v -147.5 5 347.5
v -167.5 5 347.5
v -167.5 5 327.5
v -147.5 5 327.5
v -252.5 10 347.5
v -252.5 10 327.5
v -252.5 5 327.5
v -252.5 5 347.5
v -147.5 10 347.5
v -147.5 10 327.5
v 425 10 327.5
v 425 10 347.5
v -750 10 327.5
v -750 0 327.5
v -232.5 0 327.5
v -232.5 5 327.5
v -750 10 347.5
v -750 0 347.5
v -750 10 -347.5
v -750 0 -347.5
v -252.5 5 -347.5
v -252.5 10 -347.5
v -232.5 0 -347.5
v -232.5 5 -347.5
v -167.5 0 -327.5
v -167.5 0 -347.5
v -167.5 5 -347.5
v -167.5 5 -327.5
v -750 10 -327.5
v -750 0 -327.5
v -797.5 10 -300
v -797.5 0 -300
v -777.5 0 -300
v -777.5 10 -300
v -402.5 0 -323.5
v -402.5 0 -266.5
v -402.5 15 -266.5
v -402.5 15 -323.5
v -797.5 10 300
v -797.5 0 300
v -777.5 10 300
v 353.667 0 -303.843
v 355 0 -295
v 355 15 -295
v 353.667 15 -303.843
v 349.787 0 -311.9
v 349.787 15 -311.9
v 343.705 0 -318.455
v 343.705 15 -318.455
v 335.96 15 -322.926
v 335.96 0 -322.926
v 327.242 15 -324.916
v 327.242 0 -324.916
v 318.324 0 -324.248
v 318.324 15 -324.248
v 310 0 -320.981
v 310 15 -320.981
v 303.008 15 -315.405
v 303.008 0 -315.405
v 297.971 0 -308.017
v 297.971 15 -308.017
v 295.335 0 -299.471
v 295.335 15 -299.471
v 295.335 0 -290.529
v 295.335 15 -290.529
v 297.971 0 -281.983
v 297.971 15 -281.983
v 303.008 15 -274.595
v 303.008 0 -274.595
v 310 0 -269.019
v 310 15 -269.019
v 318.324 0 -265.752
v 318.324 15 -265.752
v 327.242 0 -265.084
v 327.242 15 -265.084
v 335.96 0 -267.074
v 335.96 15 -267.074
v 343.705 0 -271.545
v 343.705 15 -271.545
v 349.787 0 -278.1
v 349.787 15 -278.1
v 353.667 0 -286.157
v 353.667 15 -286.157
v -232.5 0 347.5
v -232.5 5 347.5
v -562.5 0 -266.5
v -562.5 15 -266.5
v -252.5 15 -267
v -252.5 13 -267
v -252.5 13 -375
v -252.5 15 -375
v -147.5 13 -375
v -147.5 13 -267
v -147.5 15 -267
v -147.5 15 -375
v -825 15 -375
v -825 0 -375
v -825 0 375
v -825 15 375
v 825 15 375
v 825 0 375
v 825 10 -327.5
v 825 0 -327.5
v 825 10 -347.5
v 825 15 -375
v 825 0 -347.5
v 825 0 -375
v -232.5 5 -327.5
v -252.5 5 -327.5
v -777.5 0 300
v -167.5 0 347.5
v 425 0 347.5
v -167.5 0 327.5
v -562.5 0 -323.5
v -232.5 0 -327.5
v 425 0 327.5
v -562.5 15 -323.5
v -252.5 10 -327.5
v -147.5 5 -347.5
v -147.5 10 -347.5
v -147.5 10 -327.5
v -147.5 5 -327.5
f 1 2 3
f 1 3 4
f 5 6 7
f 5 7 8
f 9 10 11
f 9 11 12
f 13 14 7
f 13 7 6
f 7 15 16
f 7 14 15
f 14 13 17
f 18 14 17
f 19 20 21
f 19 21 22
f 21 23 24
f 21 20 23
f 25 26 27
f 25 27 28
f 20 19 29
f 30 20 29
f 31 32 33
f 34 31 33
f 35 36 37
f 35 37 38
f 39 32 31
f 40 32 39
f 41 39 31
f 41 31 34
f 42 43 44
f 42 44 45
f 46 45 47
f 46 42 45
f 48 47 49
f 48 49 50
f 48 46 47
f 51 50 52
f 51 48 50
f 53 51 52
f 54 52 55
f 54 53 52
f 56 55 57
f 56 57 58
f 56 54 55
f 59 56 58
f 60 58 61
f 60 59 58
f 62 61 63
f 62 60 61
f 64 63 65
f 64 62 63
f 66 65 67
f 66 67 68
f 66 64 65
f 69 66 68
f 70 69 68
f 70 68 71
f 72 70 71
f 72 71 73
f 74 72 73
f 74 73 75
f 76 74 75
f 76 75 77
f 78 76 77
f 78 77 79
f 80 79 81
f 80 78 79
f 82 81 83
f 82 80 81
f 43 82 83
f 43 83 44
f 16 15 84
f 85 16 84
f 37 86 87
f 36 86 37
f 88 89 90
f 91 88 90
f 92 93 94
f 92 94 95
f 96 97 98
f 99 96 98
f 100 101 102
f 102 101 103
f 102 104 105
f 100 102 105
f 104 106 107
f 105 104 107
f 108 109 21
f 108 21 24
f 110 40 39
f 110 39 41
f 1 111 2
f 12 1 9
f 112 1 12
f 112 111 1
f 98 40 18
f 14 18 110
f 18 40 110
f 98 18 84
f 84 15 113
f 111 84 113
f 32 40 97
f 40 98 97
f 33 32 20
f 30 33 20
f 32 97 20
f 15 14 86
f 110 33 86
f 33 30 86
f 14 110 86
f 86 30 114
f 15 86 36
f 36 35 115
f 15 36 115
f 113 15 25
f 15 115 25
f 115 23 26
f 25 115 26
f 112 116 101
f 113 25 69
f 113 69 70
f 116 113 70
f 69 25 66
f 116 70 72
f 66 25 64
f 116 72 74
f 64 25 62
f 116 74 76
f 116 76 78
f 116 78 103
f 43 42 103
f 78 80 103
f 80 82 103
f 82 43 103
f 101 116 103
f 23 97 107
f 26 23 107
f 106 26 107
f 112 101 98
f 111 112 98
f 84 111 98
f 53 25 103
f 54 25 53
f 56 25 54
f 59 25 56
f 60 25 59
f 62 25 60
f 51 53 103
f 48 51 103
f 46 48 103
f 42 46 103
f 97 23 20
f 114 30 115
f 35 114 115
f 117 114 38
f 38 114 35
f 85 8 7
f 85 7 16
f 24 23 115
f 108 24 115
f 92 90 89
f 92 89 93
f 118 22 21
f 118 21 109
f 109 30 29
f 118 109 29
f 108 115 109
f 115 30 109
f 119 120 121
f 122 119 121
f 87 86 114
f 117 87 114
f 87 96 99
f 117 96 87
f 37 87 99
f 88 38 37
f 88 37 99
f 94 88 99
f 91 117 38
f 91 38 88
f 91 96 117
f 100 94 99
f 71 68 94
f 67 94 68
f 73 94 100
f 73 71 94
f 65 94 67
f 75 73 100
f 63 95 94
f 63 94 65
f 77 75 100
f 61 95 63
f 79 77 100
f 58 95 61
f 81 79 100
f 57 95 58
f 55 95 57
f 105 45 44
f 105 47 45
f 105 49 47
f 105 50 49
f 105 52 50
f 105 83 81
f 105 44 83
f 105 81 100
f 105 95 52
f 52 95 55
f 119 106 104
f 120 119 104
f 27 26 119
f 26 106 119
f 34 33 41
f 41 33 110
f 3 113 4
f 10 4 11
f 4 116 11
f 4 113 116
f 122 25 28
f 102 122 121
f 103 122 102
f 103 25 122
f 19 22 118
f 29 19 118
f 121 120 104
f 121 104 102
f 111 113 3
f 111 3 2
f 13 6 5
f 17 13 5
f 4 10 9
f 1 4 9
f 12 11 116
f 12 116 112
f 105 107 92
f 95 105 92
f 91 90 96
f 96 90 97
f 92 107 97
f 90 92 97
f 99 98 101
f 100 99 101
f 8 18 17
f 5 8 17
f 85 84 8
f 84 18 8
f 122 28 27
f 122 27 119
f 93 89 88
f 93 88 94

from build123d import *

# Parameters (mm, degrees)
SKETCH1_W           = 160
SKETCH1_H           = 57
SKETCH1_R           = 30
SKETCH1_W_2         = 105
SKETCH1_H_2         = 108
BOSS_EXTRUDE1_DEPTH = 15
CUT_EXTRUDE1_START  = -572.5
SKETCH2_W           = 20
SKETCH2_H           = 10
CUT_EXTRUDE1_DEPTH  = 497.5
CUT_EXTRUDE2_START  = -677.5
SKETCH2_3_W         = 20
SKETCH2_3_H         = 10
CUT_EXTRUDE2_DEPTH  = 973.5
CUT_EXTRUDE3_START  = 13
SKETCH1_3_W         = 105
SKETCH1_3_H         = 108
CUT_EXTRUDE3_DEPTH  = 3
CUT_EXTRUDE4_START  = -572.5
SKETCH2_4_W         = 20
SKETCH2_4_H         = 10
CUT_EXTRUDE4_DEPTH  = 497.5
CUT_EXTRUDE5_START  = -1250
SKETCH2_5_W         = 20
SKETCH2_5_H         = 10
CUT_EXTRUDE5_DEPTH  = 572.5
SKETCH4_W           = 20
SKETCH4_H           = 20
CUT_EXTRUDE6_DEPTH  = 5
SKETCH3_W           = 20
SKETCH3_H           = 600
CUT_EXTRUDE7_DEPTH  = 10


with BuildPart() as part:
    # Sketch1 → Boss-Extrude1 (new body)
    with BuildSketch(Plane(origin=(0, 0, 0), x_dir=(1, 0, 0), z_dir=(0, 1, 0))):
        Polygon((-825, 375), (-825, -375), (825, -375), (825, 375), (-147.5, 375), (-147.5, 267), (-252.5, 267), (-252.5, 375), align=None)
        with Locations((-482.5, 295)):
            Rectangle(SKETCH1_W, SKETCH1_H, mode=Mode.SUBTRACT)
        with Locations((325, 295)):
            Circle(SKETCH1_R, mode=Mode.SUBTRACT)
        with Locations((-200, 321)):
            Rectangle(SKETCH1_W_2, SKETCH1_H_2)
    extrude(amount=BOSS_EXTRUDE1_DEPTH)

    # Sketch2 → Cut-Extrude1 (cut)
    with BuildSketch(Plane.ZY.offset(825).offset(CUT_EXTRUDE1_START)):
        with Locations((-337.5, 5)):
            Rectangle(SKETCH2_W, SKETCH2_H)
    extrude(amount=CUT_EXTRUDE1_DEPTH, mode=Mode.SUBTRACT)

    # Sketch2<3> → Cut-Extrude2 (cut, through all)
    with BuildSketch(Plane.ZY.offset(825).offset(CUT_EXTRUDE2_START)):
        with Locations((-337.5, 5)):
            Rectangle(SKETCH2_3_W, SKETCH2_3_H)
    extrude(amount=-CUT_EXTRUDE2_DEPTH, mode=Mode.SUBTRACT)

    # Sketch1<3> → Cut-Extrude3 (cut, through all)
    with BuildSketch(Plane(origin=(0, 0, 0), x_dir=(1, 0, 0), z_dir=(0, 1, 0)).offset(CUT_EXTRUDE3_START)):
        with Locations((-200, 321)):
            Rectangle(SKETCH1_3_W, SKETCH1_3_H)
    extrude(amount=CUT_EXTRUDE3_DEPTH, mode=Mode.SUBTRACT)

    # Sketch2<4> → Cut-Extrude4 (cut)
    with BuildSketch(Plane.ZY.offset(825).offset(CUT_EXTRUDE4_START)):
        with Locations((337.5, 5)):
            Rectangle(SKETCH2_4_W, SKETCH2_4_H)
    extrude(amount=CUT_EXTRUDE4_DEPTH, mode=Mode.SUBTRACT)

    # Sketch2<5> → Cut-Extrude5 (cut)
    with BuildSketch(Plane.ZY.offset(825).offset(CUT_EXTRUDE5_START)):
        with Locations((337.5, 5)):
            Rectangle(SKETCH2_5_W, SKETCH2_5_H)
    extrude(amount=CUT_EXTRUDE5_DEPTH, mode=Mode.SUBTRACT)

    # Sketch4 → Cut-Extrude6 (cut)
    with BuildSketch(Plane.XZ):
        with Locations((-242.5, -337.5)):
            Rectangle(SKETCH4_W, SKETCH4_H)
        with Locations((-157.5, -337.5)):
            Rectangle(SKETCH4_W, SKETCH4_H)
        with Locations((-157.5, 337.5)):
            Rectangle(SKETCH4_W, SKETCH4_H)
        with Locations((-242.5, 337.5)):
            Rectangle(SKETCH4_W, SKETCH4_H)
    extrude(amount=-CUT_EXTRUDE6_DEPTH, mode=Mode.SUBTRACT)

    # Sketch3 → Cut-Extrude7 (cut)
    with BuildSketch(Plane.XZ):
        with Locations((-787.5, 0)):
            Rectangle(SKETCH3_W, SKETCH3_H)
    extrude(amount=-CUT_EXTRUDE7_DEPTH, mode=Mode.SUBTRACT)


solid = part.part
